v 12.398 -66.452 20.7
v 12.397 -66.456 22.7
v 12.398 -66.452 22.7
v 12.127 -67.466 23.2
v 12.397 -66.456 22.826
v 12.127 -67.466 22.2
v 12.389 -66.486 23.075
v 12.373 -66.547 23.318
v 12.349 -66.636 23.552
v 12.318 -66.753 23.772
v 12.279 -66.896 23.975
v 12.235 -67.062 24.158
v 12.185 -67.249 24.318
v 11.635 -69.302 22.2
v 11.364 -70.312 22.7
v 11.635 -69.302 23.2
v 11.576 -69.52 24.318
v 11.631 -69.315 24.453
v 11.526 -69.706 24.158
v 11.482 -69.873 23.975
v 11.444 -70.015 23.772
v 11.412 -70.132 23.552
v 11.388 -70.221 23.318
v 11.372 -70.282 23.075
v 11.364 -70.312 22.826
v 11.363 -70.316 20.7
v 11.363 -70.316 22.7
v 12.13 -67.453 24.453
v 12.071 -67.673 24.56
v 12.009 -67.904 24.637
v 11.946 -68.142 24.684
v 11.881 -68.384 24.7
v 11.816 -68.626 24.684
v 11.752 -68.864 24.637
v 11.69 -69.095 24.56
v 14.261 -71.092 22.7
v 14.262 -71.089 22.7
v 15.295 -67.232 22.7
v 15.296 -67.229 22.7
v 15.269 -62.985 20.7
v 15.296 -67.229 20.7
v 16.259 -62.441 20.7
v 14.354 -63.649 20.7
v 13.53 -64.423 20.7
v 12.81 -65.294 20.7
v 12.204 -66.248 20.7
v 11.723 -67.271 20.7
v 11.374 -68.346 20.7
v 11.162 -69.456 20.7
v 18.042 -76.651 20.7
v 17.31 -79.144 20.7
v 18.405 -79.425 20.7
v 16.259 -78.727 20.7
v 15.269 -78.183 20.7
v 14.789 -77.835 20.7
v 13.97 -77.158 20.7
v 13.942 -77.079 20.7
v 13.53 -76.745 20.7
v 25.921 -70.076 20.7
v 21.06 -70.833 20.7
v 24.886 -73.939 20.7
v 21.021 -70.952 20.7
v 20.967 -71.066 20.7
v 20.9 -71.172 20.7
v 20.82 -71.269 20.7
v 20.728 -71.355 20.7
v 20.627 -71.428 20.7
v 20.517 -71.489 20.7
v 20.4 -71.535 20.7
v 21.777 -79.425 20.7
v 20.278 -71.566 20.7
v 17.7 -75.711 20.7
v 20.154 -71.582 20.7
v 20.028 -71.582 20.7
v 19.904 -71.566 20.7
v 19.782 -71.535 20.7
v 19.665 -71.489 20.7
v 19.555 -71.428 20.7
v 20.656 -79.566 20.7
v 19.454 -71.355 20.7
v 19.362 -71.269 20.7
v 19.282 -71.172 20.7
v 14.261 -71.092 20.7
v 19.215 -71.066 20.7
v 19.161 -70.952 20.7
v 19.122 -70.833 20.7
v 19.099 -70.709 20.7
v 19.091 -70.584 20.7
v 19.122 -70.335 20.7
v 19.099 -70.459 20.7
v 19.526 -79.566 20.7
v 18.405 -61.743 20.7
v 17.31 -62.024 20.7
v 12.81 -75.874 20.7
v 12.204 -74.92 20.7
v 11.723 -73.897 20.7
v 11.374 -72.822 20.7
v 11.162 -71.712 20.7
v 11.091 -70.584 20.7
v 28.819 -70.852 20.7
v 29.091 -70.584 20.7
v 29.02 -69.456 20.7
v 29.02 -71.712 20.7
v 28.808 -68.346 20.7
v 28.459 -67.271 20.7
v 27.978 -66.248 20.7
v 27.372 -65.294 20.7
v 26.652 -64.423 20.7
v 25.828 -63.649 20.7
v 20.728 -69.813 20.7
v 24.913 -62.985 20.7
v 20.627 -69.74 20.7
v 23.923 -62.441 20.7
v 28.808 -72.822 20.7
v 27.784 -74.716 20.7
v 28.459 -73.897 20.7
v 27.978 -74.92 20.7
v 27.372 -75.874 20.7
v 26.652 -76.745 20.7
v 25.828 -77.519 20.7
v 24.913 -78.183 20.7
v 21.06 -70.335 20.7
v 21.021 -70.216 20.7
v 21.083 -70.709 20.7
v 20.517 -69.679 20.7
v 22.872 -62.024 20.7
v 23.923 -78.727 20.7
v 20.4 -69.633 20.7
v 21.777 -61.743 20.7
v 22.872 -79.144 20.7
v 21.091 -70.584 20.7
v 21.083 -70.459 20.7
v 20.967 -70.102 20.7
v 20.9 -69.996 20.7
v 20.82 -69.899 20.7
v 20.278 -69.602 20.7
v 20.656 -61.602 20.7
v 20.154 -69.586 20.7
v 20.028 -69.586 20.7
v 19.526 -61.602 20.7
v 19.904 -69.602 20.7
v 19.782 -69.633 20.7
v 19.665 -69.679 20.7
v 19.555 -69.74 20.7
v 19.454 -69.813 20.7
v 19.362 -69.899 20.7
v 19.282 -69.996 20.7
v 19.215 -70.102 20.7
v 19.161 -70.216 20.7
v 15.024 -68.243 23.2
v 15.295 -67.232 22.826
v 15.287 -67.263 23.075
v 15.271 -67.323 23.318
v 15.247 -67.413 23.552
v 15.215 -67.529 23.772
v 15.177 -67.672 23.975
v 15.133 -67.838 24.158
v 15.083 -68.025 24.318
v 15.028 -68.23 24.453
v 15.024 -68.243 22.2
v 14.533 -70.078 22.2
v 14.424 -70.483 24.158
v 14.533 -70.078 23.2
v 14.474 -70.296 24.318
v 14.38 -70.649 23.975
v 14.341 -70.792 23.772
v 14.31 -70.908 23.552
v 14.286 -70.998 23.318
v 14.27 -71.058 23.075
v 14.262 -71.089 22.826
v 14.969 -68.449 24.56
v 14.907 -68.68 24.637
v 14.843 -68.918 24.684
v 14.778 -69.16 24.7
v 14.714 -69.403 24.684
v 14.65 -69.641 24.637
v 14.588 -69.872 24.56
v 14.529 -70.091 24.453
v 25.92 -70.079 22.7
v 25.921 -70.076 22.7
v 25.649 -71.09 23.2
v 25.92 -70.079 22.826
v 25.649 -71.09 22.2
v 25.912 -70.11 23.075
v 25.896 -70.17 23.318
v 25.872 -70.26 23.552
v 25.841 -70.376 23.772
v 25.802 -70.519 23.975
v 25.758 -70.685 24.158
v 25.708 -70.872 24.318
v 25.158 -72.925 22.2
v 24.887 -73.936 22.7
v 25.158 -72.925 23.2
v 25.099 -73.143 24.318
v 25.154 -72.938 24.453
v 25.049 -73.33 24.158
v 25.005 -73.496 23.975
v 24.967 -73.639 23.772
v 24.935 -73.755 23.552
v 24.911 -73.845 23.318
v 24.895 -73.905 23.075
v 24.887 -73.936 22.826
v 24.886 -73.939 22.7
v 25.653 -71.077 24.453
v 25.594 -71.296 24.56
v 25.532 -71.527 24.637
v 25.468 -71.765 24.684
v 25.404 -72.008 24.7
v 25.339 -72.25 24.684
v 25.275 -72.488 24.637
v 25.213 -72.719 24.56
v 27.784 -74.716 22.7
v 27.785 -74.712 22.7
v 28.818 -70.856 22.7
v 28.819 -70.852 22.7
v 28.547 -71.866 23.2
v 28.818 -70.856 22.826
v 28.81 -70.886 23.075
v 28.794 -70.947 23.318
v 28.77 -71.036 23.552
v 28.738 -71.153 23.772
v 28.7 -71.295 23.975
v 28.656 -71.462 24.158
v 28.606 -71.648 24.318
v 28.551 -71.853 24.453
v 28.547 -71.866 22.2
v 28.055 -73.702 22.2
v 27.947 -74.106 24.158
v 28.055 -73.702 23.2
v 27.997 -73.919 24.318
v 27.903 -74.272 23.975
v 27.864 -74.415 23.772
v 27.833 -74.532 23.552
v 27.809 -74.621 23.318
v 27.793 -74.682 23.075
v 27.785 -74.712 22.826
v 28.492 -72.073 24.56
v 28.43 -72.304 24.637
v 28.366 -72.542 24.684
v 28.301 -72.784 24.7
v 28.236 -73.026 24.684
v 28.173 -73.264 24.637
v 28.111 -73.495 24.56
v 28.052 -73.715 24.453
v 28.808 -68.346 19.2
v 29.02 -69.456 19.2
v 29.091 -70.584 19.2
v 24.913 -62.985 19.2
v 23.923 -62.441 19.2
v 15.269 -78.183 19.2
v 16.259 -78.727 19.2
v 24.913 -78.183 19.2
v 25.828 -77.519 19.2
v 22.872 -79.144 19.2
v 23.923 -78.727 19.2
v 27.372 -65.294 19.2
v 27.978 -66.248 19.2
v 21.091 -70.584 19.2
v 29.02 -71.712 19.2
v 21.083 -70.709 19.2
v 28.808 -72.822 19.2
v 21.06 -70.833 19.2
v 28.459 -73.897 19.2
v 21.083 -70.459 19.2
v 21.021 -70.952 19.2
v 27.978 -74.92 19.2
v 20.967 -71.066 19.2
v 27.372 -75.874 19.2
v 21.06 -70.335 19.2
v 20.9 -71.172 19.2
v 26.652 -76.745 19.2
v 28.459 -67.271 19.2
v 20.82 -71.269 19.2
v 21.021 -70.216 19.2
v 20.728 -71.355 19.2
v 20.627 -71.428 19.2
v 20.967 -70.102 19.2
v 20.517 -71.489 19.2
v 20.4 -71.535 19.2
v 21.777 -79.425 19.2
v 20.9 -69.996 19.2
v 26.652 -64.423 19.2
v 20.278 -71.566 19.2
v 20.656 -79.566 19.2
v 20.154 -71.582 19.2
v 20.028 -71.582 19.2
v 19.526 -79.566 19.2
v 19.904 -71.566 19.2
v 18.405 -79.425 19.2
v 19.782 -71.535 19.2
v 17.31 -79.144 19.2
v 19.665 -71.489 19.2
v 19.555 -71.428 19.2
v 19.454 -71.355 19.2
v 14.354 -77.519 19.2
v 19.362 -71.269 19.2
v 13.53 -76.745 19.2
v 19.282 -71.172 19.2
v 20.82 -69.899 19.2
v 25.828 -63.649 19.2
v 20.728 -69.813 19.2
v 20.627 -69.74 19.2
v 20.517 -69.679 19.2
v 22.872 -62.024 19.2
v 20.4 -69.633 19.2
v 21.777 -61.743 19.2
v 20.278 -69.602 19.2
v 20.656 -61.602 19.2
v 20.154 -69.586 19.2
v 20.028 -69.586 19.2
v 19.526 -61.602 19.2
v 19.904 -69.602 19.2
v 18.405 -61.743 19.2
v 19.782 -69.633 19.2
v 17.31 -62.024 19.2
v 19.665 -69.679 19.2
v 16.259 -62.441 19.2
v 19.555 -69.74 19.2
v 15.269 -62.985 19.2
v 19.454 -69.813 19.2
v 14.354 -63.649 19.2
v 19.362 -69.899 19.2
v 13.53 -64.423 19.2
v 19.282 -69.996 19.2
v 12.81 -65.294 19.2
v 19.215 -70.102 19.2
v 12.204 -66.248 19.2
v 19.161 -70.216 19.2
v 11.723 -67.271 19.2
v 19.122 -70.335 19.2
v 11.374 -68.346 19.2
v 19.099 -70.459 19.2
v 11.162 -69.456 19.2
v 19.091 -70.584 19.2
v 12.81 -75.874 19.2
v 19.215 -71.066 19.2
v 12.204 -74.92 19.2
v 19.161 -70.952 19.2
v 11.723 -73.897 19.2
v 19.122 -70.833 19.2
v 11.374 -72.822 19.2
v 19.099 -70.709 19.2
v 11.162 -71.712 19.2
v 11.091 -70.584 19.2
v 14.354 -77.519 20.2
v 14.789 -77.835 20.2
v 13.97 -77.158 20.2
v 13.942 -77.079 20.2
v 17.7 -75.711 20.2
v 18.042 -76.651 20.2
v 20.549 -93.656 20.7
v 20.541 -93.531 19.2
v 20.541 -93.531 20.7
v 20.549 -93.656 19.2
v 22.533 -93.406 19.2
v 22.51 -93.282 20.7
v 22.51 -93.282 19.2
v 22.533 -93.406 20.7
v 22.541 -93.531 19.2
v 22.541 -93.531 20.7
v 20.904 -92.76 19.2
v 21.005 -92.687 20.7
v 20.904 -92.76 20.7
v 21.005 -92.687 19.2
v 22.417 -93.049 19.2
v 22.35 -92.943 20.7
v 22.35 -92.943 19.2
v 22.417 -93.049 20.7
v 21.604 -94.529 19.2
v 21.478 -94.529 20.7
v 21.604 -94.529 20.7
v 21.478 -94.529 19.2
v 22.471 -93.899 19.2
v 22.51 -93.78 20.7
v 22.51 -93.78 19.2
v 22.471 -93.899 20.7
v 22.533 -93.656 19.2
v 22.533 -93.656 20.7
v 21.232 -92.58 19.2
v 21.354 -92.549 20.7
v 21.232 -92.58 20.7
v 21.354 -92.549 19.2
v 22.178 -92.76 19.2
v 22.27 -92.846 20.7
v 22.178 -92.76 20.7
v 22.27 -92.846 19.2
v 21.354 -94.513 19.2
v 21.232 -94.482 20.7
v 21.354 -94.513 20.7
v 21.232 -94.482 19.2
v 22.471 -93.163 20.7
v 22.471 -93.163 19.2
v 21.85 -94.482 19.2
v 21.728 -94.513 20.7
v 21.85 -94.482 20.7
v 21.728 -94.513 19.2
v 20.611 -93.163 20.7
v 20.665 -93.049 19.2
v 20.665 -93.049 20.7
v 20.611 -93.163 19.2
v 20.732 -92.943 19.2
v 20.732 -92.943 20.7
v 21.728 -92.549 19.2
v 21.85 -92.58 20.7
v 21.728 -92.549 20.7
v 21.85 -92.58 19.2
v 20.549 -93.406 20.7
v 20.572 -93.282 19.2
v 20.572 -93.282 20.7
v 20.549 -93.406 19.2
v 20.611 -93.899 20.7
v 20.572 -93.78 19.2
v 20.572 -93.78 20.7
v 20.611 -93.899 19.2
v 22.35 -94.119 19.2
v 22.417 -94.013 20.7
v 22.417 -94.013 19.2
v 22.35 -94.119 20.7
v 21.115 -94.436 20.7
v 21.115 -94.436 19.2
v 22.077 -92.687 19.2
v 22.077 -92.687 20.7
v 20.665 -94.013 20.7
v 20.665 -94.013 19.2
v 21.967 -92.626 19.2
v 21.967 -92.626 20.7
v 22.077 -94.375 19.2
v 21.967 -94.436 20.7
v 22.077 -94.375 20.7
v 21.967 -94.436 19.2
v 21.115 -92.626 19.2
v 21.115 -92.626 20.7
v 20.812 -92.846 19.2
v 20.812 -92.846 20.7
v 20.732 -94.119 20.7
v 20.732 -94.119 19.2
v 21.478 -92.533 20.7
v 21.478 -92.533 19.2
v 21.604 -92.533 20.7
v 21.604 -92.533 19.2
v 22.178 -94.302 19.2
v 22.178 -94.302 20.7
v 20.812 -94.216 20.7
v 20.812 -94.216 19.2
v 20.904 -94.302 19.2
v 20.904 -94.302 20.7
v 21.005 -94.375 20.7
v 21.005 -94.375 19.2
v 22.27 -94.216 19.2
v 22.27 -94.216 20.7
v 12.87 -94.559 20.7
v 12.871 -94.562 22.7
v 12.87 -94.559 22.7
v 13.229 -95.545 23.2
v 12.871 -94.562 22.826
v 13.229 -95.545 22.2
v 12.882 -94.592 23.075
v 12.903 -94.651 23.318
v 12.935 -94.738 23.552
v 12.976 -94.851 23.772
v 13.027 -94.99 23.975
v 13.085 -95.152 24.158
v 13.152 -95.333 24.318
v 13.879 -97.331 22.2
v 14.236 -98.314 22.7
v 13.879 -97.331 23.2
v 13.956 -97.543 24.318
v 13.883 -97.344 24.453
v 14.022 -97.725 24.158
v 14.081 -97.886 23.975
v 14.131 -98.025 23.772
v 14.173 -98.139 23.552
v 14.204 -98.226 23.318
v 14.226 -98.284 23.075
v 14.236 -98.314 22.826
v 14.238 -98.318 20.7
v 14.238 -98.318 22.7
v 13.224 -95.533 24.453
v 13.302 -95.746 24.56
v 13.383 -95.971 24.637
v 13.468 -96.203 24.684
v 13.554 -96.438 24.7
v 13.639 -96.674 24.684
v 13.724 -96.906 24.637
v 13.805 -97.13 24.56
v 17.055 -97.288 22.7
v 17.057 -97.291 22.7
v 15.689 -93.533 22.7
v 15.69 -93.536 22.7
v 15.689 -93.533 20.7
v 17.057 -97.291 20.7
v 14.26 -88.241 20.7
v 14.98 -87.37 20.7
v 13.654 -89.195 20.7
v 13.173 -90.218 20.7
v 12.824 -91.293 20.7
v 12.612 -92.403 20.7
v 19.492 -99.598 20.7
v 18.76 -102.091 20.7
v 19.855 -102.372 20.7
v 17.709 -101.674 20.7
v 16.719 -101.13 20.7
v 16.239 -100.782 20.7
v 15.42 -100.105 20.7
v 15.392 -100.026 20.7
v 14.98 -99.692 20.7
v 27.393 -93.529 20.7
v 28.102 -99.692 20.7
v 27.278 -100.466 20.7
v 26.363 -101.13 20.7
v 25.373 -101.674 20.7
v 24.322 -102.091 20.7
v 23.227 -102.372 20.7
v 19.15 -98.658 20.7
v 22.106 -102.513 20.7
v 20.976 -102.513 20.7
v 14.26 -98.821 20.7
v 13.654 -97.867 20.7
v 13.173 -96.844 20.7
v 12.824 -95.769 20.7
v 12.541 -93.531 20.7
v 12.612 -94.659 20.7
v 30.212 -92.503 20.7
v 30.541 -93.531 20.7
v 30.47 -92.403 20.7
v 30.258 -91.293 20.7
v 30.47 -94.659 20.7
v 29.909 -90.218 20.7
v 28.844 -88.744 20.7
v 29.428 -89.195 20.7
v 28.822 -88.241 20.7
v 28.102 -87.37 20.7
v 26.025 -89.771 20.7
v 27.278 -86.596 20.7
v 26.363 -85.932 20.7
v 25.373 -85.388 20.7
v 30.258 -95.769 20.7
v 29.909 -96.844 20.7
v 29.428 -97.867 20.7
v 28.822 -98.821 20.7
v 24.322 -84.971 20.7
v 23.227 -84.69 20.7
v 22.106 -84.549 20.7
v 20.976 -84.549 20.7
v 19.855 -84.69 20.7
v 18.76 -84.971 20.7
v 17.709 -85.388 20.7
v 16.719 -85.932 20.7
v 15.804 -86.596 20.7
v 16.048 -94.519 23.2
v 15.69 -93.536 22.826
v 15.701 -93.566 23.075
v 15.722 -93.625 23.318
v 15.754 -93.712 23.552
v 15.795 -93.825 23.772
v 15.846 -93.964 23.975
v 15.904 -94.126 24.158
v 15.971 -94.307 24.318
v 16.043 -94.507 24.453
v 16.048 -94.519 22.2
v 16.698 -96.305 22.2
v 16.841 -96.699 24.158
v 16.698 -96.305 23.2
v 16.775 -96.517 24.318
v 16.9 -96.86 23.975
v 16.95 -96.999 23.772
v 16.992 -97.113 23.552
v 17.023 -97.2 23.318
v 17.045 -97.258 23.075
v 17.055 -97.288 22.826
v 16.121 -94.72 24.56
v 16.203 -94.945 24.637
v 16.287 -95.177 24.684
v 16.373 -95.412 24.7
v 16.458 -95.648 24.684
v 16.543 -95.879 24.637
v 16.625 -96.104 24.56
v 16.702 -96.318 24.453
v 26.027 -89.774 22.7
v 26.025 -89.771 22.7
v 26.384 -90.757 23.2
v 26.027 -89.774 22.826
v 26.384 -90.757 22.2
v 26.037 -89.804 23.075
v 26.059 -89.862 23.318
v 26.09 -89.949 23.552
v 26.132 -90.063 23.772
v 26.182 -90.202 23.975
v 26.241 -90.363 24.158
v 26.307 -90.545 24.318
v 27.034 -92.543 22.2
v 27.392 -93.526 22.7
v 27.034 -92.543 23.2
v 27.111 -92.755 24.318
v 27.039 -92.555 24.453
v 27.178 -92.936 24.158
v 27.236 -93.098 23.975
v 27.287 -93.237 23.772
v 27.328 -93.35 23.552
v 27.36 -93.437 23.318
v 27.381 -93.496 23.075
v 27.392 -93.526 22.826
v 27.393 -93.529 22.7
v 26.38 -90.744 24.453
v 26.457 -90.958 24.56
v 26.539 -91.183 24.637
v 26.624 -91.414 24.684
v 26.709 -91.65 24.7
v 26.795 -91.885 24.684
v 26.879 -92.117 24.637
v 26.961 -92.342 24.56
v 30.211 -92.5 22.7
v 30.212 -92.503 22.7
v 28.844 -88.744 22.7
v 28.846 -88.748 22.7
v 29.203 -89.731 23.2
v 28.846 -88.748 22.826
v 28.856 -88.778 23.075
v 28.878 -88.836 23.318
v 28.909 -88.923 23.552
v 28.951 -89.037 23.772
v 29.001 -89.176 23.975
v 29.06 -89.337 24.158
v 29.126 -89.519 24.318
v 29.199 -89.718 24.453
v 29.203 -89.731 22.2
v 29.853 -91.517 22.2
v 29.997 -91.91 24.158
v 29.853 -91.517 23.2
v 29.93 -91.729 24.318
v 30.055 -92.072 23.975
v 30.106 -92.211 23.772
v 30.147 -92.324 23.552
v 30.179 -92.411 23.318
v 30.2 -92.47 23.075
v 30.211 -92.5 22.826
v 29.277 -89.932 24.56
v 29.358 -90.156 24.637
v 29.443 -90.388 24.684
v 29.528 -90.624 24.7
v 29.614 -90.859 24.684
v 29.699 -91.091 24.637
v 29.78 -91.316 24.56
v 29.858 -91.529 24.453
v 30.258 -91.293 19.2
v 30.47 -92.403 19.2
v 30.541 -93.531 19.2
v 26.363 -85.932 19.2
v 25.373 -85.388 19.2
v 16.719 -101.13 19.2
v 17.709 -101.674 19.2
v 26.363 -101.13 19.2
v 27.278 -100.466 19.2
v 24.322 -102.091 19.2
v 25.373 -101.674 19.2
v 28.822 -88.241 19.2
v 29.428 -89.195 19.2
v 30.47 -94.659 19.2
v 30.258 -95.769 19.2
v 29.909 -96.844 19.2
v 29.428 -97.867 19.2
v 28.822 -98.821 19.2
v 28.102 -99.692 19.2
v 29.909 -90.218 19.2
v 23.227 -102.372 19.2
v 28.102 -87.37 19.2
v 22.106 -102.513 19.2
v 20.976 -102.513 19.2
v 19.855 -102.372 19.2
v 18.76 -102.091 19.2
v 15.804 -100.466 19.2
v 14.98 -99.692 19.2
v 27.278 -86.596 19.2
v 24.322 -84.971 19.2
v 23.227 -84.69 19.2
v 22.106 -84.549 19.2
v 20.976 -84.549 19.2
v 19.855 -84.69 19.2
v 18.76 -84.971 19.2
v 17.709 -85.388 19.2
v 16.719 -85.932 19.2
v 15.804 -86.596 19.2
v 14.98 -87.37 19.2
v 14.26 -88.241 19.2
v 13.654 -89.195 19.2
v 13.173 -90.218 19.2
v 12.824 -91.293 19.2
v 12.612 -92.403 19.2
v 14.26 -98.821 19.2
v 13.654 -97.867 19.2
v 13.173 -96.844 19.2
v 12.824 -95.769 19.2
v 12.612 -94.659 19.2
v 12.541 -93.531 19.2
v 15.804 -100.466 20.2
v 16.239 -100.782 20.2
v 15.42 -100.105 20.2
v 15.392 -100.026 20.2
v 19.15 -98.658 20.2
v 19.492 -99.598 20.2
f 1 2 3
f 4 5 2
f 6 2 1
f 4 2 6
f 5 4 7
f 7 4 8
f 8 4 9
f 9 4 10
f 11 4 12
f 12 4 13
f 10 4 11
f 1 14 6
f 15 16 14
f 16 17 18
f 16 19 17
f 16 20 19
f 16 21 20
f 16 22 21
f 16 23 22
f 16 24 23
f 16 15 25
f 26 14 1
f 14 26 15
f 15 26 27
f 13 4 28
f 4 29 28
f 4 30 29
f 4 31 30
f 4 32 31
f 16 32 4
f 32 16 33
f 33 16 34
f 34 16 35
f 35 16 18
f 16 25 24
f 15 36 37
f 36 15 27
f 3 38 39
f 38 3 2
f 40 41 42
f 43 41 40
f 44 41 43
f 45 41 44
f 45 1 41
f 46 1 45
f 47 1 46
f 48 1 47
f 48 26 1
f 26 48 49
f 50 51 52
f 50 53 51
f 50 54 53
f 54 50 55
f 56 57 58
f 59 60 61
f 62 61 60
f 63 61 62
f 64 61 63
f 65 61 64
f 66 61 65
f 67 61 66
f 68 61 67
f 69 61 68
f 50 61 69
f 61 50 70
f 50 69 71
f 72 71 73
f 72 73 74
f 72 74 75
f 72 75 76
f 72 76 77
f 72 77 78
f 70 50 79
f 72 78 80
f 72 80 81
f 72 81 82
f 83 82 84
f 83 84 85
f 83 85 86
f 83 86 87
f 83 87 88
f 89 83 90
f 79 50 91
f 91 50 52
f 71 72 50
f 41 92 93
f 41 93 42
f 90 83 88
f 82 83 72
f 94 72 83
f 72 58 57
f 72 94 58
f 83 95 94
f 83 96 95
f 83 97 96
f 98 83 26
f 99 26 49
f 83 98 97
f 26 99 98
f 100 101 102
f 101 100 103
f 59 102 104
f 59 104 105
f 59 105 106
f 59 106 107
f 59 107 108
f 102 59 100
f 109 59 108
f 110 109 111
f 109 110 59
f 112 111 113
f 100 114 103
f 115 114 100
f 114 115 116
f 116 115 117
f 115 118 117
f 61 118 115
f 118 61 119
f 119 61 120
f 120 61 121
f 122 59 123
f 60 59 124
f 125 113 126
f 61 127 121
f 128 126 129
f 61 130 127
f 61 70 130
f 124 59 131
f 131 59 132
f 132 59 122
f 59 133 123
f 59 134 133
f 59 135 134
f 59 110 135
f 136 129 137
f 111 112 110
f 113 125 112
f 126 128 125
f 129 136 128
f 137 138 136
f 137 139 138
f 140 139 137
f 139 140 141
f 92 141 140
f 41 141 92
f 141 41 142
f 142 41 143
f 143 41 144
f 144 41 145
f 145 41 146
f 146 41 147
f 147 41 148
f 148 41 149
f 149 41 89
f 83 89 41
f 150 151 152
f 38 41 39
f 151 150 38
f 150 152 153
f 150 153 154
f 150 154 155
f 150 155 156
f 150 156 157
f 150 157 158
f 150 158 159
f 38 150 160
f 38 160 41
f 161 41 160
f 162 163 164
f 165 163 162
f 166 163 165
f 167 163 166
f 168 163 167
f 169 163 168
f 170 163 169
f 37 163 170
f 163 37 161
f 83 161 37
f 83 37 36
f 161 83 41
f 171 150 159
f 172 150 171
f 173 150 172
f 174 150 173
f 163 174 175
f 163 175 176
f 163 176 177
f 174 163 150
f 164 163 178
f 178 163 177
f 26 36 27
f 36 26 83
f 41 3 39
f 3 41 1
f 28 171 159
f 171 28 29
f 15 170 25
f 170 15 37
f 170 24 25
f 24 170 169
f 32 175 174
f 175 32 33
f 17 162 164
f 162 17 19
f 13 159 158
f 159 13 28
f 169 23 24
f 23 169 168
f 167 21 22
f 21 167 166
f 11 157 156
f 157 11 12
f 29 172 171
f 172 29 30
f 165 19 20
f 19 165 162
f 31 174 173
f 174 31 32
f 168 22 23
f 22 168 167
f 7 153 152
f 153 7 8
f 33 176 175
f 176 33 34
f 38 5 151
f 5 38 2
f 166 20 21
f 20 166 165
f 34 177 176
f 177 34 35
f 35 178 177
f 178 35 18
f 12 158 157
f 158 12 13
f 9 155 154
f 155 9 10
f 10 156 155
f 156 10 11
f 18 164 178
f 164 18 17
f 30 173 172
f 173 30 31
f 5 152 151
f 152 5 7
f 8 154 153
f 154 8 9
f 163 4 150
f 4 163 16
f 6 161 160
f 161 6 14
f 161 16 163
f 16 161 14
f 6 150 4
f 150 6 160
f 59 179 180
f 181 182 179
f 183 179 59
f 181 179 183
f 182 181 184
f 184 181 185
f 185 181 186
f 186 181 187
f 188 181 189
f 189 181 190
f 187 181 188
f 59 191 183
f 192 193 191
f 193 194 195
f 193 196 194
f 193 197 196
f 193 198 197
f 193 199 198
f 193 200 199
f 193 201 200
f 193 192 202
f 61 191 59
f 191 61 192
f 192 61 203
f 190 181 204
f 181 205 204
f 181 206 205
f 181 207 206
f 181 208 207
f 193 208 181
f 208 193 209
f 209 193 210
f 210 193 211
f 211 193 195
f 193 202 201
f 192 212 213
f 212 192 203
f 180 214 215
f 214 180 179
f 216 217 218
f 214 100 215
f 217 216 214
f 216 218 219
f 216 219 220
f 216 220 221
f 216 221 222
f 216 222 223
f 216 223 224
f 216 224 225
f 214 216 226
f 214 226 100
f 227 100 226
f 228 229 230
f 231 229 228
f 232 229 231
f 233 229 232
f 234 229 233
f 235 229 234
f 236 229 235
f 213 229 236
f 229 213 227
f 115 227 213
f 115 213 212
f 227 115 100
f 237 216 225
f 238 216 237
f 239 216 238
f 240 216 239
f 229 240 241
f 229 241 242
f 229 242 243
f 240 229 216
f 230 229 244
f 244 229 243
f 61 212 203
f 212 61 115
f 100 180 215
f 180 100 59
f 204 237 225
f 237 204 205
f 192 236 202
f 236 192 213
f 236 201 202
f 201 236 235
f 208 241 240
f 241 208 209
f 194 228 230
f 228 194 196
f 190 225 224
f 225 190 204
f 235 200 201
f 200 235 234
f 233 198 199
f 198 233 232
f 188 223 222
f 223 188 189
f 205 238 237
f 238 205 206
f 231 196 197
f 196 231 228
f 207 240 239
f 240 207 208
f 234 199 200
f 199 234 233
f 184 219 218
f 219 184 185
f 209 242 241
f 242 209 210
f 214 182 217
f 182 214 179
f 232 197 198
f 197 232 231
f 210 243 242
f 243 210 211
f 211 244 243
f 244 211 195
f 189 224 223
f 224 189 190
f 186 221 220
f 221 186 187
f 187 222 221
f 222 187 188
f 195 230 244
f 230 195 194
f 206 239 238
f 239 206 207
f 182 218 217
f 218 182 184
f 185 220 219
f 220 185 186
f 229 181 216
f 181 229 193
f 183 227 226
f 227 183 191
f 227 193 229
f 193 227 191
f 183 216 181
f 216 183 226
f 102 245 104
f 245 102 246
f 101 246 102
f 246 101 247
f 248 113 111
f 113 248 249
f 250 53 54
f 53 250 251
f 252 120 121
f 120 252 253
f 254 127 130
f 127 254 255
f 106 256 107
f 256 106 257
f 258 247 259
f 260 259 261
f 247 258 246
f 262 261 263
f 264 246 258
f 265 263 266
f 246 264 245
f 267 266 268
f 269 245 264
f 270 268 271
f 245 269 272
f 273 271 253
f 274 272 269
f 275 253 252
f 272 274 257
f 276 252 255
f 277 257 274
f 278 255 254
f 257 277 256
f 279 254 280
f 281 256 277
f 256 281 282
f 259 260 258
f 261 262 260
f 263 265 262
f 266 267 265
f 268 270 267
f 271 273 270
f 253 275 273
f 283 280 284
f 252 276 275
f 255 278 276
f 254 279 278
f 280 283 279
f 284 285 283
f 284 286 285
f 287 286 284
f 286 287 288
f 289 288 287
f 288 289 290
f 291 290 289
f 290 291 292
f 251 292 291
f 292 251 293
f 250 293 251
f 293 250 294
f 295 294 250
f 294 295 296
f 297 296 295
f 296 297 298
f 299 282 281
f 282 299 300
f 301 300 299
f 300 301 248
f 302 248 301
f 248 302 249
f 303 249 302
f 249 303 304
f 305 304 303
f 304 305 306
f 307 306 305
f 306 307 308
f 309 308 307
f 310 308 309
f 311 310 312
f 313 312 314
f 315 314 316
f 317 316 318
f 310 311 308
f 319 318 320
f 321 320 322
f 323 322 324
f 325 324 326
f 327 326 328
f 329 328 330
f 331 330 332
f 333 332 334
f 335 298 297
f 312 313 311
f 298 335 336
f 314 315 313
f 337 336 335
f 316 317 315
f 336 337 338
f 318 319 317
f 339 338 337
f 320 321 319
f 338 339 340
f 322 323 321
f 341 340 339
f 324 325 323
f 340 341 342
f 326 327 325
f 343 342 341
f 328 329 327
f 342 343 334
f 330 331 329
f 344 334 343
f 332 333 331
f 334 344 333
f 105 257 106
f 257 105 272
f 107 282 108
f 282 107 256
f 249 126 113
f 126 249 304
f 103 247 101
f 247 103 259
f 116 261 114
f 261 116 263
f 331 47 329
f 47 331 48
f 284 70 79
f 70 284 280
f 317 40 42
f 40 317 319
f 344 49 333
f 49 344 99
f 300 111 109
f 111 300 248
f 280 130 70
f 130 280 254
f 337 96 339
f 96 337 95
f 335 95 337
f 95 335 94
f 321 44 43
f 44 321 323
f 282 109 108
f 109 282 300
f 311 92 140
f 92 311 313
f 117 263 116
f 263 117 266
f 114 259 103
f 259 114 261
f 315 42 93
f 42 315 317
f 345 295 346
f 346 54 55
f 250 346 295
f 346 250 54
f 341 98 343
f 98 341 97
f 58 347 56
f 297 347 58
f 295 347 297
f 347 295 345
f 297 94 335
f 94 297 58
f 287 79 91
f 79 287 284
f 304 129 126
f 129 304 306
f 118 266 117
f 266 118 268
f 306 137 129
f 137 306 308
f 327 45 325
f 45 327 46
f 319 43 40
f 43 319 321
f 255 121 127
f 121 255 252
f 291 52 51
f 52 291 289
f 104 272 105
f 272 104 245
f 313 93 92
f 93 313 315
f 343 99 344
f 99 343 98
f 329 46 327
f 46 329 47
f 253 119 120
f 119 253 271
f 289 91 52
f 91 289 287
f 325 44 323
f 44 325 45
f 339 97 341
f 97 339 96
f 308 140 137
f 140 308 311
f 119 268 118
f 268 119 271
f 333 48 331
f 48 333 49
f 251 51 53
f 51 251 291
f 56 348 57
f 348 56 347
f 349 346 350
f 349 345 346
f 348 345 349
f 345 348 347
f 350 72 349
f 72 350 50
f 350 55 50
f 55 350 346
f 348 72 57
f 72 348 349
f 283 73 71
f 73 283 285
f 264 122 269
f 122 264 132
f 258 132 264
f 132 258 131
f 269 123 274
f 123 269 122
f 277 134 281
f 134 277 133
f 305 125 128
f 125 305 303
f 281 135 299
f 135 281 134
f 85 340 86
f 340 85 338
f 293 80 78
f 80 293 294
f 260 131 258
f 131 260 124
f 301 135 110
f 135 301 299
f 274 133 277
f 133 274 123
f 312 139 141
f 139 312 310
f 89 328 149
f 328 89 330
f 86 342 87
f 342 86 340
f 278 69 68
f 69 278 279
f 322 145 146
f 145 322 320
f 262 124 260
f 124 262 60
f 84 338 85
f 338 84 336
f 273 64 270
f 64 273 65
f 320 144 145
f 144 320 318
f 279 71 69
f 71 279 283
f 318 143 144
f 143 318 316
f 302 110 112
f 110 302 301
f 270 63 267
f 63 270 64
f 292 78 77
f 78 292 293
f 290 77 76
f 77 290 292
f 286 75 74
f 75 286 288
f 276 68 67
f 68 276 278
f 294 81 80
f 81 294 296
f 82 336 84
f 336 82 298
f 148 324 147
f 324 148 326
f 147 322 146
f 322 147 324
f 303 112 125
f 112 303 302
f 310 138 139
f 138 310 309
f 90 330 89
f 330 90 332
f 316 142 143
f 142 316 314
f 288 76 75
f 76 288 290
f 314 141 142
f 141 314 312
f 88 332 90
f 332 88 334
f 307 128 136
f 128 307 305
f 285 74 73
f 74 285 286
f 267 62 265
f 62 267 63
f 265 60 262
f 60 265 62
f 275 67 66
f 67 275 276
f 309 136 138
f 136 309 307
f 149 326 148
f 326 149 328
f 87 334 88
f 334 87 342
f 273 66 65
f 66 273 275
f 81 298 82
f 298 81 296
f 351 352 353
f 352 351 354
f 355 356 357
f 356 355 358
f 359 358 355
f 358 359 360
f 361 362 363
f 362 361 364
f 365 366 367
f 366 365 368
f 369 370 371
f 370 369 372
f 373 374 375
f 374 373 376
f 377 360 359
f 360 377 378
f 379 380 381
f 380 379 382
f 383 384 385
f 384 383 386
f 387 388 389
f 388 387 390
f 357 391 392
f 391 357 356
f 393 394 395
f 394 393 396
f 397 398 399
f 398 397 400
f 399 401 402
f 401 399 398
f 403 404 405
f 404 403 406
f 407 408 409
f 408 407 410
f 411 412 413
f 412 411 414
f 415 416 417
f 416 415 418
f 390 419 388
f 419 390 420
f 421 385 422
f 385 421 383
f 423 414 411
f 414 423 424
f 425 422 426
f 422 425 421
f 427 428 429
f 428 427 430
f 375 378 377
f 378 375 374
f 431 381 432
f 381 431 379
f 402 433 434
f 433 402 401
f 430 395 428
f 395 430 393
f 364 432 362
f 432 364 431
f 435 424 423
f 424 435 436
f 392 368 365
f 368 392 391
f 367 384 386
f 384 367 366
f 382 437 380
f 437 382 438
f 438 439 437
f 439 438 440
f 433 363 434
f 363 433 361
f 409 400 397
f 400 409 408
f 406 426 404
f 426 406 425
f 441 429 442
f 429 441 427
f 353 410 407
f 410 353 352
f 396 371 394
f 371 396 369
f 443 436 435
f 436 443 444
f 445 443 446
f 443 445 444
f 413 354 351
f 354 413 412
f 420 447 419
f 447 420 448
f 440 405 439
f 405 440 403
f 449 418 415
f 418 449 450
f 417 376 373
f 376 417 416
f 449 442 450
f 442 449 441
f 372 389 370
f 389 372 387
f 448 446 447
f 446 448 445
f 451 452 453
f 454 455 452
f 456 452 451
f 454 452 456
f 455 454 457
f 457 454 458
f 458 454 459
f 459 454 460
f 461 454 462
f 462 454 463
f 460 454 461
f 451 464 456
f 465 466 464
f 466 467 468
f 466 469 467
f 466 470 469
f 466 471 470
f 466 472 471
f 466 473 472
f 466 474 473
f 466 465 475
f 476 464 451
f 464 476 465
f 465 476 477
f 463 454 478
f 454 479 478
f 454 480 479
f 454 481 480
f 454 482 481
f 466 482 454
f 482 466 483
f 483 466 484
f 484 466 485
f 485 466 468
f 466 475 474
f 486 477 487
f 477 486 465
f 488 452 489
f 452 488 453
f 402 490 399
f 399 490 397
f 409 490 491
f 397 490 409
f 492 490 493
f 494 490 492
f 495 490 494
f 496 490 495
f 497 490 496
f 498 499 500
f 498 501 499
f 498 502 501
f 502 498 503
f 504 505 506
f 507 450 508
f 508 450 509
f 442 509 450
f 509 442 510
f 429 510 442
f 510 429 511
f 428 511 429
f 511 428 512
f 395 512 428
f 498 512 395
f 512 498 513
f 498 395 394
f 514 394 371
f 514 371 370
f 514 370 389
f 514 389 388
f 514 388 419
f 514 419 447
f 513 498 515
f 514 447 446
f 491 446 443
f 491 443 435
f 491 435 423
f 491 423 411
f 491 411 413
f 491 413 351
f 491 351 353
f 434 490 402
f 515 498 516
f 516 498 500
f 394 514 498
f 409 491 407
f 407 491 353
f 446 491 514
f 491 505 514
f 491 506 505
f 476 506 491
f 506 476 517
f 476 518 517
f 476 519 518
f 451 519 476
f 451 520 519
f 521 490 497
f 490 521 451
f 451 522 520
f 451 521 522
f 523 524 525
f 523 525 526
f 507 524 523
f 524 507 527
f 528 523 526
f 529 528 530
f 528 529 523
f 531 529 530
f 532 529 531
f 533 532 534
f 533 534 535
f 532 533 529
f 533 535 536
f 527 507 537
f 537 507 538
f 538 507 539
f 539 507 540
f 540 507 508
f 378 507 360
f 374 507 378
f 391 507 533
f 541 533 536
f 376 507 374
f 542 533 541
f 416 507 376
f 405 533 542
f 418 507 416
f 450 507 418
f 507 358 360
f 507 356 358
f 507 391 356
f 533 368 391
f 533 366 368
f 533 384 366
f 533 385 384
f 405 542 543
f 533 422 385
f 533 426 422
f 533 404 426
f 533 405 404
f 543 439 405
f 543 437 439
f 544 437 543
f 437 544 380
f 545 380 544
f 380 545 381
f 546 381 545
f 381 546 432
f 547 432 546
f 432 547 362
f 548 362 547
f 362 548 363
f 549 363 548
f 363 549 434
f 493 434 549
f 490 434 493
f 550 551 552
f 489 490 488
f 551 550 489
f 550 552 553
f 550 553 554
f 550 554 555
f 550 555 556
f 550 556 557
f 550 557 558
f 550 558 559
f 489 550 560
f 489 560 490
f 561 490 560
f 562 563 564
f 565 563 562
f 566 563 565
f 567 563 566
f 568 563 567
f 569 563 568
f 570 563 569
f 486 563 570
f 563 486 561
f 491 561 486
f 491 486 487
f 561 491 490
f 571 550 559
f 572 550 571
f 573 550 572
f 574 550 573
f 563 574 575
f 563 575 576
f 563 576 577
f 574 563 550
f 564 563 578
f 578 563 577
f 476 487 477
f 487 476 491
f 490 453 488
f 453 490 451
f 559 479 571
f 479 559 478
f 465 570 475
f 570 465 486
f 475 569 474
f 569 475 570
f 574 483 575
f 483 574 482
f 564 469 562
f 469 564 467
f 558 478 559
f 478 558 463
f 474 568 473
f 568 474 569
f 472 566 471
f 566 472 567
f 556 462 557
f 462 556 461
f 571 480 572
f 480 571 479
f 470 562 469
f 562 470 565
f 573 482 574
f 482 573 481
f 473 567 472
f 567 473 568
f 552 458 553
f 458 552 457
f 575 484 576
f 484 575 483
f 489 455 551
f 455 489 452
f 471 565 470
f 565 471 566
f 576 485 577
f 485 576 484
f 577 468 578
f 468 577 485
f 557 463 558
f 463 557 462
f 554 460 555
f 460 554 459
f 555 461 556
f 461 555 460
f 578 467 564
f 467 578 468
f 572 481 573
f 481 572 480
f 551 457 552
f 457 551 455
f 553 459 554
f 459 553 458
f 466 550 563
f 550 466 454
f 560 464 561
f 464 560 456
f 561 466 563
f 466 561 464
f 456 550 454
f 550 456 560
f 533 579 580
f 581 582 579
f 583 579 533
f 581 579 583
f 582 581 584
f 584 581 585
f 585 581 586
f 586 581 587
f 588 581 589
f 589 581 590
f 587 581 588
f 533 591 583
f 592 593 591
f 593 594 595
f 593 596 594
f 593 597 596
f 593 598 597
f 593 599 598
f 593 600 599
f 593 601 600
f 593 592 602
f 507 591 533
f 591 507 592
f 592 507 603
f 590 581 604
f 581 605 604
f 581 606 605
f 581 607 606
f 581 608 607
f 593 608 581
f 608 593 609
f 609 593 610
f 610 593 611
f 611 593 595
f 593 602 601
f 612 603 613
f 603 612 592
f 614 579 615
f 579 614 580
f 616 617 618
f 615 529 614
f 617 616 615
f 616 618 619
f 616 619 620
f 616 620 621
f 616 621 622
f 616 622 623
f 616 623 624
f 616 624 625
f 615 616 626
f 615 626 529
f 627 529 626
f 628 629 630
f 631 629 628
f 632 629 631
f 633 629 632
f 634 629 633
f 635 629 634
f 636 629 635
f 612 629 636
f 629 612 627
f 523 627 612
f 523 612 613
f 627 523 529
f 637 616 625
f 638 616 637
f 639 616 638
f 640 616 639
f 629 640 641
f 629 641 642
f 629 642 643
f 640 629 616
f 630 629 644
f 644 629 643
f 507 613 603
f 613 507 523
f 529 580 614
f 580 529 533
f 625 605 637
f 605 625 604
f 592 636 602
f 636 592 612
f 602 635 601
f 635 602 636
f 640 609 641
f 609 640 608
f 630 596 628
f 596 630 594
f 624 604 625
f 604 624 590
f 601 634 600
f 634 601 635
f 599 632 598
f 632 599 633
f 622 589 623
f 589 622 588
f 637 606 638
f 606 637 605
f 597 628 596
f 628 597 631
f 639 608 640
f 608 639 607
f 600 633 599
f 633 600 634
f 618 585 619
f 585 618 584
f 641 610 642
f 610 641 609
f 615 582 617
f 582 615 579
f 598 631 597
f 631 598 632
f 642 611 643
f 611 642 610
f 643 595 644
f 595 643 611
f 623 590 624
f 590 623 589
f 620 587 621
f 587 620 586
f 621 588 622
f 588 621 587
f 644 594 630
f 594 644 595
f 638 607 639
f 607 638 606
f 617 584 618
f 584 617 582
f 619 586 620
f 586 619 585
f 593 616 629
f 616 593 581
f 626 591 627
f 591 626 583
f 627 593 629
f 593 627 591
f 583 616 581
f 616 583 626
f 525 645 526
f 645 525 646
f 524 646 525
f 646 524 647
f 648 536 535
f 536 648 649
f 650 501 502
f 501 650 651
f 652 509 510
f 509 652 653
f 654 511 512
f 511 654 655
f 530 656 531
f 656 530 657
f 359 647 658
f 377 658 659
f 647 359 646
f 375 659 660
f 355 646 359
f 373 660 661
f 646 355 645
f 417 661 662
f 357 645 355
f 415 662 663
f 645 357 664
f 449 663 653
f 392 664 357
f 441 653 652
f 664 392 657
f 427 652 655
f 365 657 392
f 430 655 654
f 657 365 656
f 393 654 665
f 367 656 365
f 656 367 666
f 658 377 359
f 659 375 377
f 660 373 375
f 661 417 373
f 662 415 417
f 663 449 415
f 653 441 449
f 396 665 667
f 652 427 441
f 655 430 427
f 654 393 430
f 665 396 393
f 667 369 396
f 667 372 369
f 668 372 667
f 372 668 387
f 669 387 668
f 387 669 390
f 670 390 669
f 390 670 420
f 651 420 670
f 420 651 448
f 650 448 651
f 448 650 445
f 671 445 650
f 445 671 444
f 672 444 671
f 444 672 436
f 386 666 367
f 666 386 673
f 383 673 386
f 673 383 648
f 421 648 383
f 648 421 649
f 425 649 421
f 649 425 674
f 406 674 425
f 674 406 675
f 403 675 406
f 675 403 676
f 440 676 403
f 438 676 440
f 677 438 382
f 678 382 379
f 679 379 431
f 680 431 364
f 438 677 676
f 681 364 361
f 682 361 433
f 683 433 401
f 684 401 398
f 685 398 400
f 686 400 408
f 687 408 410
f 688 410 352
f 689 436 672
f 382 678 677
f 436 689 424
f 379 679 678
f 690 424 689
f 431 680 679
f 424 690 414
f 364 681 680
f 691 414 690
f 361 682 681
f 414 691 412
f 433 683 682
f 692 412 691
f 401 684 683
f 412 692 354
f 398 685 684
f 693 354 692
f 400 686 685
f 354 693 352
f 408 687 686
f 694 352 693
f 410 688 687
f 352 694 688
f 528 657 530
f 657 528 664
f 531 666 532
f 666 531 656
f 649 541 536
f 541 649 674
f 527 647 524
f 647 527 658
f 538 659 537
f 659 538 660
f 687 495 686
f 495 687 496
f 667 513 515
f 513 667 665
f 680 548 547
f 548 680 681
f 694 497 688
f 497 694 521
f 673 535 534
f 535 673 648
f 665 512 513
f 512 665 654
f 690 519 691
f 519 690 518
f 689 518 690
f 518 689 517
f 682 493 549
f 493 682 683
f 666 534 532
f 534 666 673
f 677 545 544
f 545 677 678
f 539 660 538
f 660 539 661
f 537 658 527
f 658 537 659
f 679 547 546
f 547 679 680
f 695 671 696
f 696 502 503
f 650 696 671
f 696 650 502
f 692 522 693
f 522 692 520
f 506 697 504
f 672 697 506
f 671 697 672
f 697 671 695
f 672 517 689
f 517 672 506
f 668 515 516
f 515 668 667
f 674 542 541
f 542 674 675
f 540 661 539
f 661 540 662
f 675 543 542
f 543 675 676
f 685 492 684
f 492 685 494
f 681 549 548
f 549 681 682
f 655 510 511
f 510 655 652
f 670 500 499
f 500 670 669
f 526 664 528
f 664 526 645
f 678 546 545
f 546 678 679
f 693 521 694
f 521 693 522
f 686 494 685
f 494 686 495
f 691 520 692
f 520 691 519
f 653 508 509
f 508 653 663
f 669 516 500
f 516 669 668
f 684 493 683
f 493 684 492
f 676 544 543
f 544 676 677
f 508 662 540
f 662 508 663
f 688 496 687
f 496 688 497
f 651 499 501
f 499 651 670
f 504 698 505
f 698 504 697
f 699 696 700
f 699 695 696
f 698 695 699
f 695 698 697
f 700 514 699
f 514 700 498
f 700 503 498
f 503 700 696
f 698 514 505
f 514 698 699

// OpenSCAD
// file: camPinHoles.scad
include<params.scad>;
include<camplate_coords.scad>;
include<utils.scad>;

module camPinHoles(camPinDiam = 2.0) {
    translate(wpPin)
    pinHole(camPinDiam);   
    translate(flip(wpPin))
    mirror([1,0,0])
    pinHole(camPinDiam);
    translate(holdPin)
    pinHole(camPinDiam);   
    translate(flip(holdPin))
    mirror([1,0,0])
    pinHole(camPinDiam);
}

module pinHole(camPinDiam) {
        cylinder((camHeight + camPlateHeight + 1) * 2, d = camPinDiam, center = true);
}
// file: utils.scad
function flip(coords) = [CAM_PLATE_WIDTH - coords[0], coords[1], coords[2]];
// file: camplate_coords.scad
include<params.scad>;

camClearance = 2;

tCamCoords = [43.724 - xOffset, -90.844, camClearance];
tPivotCoords = [96.191 - xOffset, -90.75, camHeight + camPlateHeight/2 - 1];
nutCoords = [54.746 - xOffset, -72.624, camClearance];
tSlotCoords = [56.62 - xOffset, -70.401, camHeight - 1];
frontWallCoords = [46.178 - xOffset, -97, camClearance];
backWallCoords = [16.5 - xOffset, -63.999, camClearance];
bumperCoords = [94.5 - xOffset, -75.85, camClearance];

wpPin = [36.591 - xOffset, -70.584, 0]; 
holdPin = [38.041 - xOffset, -93.531, 0];

wpCamCoord = [25.392 - xOffset, -77.327, camClearance];
wpCamSpringCoord = [29.967 - xOffset, -72.587, camHeight - 3 + 0.05];
wpCamSpringRevCoord = [34.564 - xOffset, -72.581, camHeight - tolerance];

holdCamCoord = [19.867 - xOffset, -101.933, camClearance];
holdCamSpringCoord = [32.226 - xOffset, -98.494, camHeight - 3 + 0.05];
holdCamSpringRevCoord = [36.04 - xOffset, -95.531, camHeight - tolerance];

tPointerCoord = [43.724 - xOffset, -93.75, camHeight + camPlateHeight+ tolerance];
tensionMarksDist = -65;
tensionMarksStartAngle = 360-23.5;
tensionAngleInc = 1;
// file: params.scad
/*

Values in `camelCase` are user-variable (within reason); 
values like numNeedles and screwDiam, etc.,  can be modified to
accommodate user preference or hardware subsitution. 

Values in `ALL_CAPS` should be considered CONSTANTS and should
only be modified with *extreme caution* as they will affect the 
relationship between the needles and the cams, which could
prevent stitches from forming correctly.

I recommend only modifying these constants if you are also 
making changes to the cam design in the technical sketch.
*/

$fn = 50;

gauge = 6.5;
numNeedles = 5;
tolerance = 0.2; // allows a bit of room for parts that have to fit together; adjust according to your printer's precision

// ---
// Hardware dimensions 
// (actual measurements, no tolerances)

// - pan head 6-32 machine screws
screwDiam = 3.45;
screwHeight = 18;
screwHeadDiam = 6.75 + tolerance * 2; 
screwHeadHeight = 2.55 + tolerance * 2;
nutWidth = 7.9;
nutHeight = 2.8;

// - pan head 4-40 machine screws (M3 should also work where these are used)
screwDiamSm = 2.79;
screwHeightSm = 14.62;
screwHeadHeightSm = 2.41 + tolerance * 2;
screwHeadDiamSm = 5.21 + tolerance * 2;

// TODO: look for metric hardware alternatives while abroad 

// ---
// Needle dimensions
// - Brother needles
BUTT_HEIGHT = 15;
NEEDLE_WIDTH = 1.25;
NEEDLE_LEG_HEIGHT = 1.85;
HOOK_DIAM = 3.5;

// ---
// Needle Bed Zones
BACK_COVER = 45;
OOW_TRACK = 8;
B_TRACK = 42; // will divvy up working tracks (B & C position) later
C_TRACK = 0;
WORKING_TRACK = B_TRACK + C_TRACK;
HOLD_TRACK = 8;
SPONGE_BAR = 12;
COMB = 29;
NEEDLE_EXTENSION = 34.5;

// ---
// Needle bed dimensions
NEEDLE_BED_DEPTH = BACK_COVER + OOW_TRACK + WORKING_TRACK + HOLD_TRACK + SPONGE_BAR + COMB;
needleBedHeight = screwHeight + 2;
needleSlotHeight = NEEDLE_LEG_HEIGHT * 2 + screwHeadHeight;
needleSlotWidth = NEEDLE_WIDTH + 0.25; // add a small amount of clearance
combWidth = gauge*2/3; // width of cutouts for stitch formation; this gives room for the thickness of the yarn looped around the needle when it pulls back into the slot, but has to balance leaving enough material for the remaining "teeth" to not be too fragile
spongeThickness = 2.5;
spongeBarThickness = needleSlotHeight - NEEDLE_LEG_HEIGHT - spongeThickness;
YARN_DEPOSIT_Y = -155.1;
YARN_DEPOSIT_Z = -needleSlotHeight + HOOK_DIAM;
connectorOffset = 20;

screwPlacement = 3; // how many needles from edge of bed; min 2, max floor(numNeedles/2)

// ---
// Carriage dimensions
// refer to technical sketch
camHeight = BUTT_HEIGHT; // thickness of the tracks the needles ride along
camPlateHeight = 4; // plate behind the cams
CAM_PLATE_WIDTH = 91 * 2; 
CAM_PLATE_DEPTH = NEEDLE_BED_DEPTH - COMB + 6;

railDepth = 8;
railHeight = 8; // ???
xOffset = 16.5;
//vCamScrews = [[34-xOffset, -90.25, 0],[58-xOffset, -74.25, 0],[86-xOffset,-90.25, 0]];

echo(needleSlotHeight);
// main file
include<params.scad>;
include<camplate_coords.scad>;
include<utils.scad>;
include<camPinHoles.scad>;

//leverPlatePeg(); // debug at origin

module leverPlatePeg() {
    // hole is sized for a piece of bobby pin (flat side) measuring 1.5mm wide x 0.6mm thick
    
    bobbyWidth = 1.5;
    bobbyHeight = 0.6;
    difference() {
        union() {
            translate([0,0,1])
            cube([3,4,2], center = true);
            translate([-1.5,0,2])
            rotate([0,90,0])
            cylinder(3,2,2);
        }
        translate([0,0,2])
        cube([3.5, bobbyWidth + tolerance*2, bobbyHeight + tolerance*2], center = true);    
    }
}

module leverPlate(rot) {
//    color("orange")
    difference() {
        translate([0,0,camHeight + camPlateHeight + 1.5/2 + tolerance])    { 
            union() {
                cylinder(h = 1.5, d = 18, center = true); 
                rotate([0,0,rot]) {
                    translate([7,0,1.5/2])
                    color("lime")
                    leverPlatePeg();
                    translate([-7,0,1.5/2])
                    color("blue")
                    leverPlatePeg();
                } 
            } 
        }  // alignment "lock"
//        alignmentMark(tol = tolerance);
        rotate([0,0,200])
        translate([4,4,camHeight + camPlateHeight + 1 + tolerance])
        #cube([4,1,1]);
    }   
}

// print 2 each, mirrored

difference() {
    translate(wpPin)
    leverPlate(165);
    translate([0,0,2])
    camPinHoles();
}

difference() {
    translate(holdPin)
    leverPlate(200);
    translate([0,0,2])
    camPinHoles();
}
